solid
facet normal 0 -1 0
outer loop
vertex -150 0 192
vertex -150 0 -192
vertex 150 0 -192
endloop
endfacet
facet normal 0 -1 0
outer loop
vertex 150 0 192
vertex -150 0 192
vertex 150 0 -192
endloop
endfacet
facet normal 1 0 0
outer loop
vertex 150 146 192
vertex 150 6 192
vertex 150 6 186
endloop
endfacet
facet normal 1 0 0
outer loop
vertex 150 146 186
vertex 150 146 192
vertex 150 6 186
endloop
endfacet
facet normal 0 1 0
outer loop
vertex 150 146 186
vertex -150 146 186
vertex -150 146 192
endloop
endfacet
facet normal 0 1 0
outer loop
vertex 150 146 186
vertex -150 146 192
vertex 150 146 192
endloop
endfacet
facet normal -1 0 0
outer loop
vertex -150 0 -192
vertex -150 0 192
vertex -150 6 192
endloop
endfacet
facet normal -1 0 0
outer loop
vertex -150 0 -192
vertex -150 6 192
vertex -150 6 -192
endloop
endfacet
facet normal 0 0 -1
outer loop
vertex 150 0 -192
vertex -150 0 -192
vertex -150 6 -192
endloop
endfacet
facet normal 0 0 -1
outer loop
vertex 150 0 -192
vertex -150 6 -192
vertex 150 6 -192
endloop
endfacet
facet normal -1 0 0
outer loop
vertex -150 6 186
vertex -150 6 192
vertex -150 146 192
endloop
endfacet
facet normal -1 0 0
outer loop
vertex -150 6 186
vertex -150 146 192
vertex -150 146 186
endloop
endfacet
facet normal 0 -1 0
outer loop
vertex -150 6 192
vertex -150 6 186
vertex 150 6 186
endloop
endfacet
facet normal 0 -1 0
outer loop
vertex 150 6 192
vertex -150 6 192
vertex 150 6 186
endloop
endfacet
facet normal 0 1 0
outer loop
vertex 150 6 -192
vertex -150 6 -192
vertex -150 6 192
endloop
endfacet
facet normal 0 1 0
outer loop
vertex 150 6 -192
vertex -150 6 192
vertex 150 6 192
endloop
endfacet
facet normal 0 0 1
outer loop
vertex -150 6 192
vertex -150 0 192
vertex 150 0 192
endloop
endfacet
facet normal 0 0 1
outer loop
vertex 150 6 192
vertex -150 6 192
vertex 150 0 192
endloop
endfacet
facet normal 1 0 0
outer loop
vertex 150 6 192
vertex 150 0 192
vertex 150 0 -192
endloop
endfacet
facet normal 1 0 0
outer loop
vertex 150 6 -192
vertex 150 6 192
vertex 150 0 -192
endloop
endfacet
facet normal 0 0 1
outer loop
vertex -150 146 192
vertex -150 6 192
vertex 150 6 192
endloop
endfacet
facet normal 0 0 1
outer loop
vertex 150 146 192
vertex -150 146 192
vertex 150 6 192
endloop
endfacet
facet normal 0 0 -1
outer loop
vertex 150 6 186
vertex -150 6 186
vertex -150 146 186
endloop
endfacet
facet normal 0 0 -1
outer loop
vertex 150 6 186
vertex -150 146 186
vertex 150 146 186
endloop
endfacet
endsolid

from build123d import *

# Parameters (mm, degrees)
SKETCH1_W           = 300
SKETCH1_H           = 384
BOSS_EXTRUDE1_DEPTH = 6
SKETCH2_W           = 300
SKETCH2_H           = 6
BOSS_EXTRUDE2_DEPTH = 140


with BuildPart() as part:
    # Sketch1 → Boss-Extrude1 (new body)
    with BuildSketch(Plane(origin=(0, 0, 0), x_dir=(1, 0, 0), z_dir=(0, 1, 0))):
        Rectangle(SKETCH1_W, SKETCH1_H)
    extrude(amount=BOSS_EXTRUDE1_DEPTH)


with BuildPart() as body_2:
    # Sketch2 → Boss-Extrude2 (new body)
    with BuildSketch(Plane(origin=(0, 6, 0), x_dir=(1, 0, 0), z_dir=(0, 1, 0))):
        with Locations((0, -189)):
            Rectangle(SKETCH2_W, SKETCH2_H)
    extrude(amount=BOSS_EXTRUDE2_DEPTH)


solid = Compound([part.part, body_2.part])
